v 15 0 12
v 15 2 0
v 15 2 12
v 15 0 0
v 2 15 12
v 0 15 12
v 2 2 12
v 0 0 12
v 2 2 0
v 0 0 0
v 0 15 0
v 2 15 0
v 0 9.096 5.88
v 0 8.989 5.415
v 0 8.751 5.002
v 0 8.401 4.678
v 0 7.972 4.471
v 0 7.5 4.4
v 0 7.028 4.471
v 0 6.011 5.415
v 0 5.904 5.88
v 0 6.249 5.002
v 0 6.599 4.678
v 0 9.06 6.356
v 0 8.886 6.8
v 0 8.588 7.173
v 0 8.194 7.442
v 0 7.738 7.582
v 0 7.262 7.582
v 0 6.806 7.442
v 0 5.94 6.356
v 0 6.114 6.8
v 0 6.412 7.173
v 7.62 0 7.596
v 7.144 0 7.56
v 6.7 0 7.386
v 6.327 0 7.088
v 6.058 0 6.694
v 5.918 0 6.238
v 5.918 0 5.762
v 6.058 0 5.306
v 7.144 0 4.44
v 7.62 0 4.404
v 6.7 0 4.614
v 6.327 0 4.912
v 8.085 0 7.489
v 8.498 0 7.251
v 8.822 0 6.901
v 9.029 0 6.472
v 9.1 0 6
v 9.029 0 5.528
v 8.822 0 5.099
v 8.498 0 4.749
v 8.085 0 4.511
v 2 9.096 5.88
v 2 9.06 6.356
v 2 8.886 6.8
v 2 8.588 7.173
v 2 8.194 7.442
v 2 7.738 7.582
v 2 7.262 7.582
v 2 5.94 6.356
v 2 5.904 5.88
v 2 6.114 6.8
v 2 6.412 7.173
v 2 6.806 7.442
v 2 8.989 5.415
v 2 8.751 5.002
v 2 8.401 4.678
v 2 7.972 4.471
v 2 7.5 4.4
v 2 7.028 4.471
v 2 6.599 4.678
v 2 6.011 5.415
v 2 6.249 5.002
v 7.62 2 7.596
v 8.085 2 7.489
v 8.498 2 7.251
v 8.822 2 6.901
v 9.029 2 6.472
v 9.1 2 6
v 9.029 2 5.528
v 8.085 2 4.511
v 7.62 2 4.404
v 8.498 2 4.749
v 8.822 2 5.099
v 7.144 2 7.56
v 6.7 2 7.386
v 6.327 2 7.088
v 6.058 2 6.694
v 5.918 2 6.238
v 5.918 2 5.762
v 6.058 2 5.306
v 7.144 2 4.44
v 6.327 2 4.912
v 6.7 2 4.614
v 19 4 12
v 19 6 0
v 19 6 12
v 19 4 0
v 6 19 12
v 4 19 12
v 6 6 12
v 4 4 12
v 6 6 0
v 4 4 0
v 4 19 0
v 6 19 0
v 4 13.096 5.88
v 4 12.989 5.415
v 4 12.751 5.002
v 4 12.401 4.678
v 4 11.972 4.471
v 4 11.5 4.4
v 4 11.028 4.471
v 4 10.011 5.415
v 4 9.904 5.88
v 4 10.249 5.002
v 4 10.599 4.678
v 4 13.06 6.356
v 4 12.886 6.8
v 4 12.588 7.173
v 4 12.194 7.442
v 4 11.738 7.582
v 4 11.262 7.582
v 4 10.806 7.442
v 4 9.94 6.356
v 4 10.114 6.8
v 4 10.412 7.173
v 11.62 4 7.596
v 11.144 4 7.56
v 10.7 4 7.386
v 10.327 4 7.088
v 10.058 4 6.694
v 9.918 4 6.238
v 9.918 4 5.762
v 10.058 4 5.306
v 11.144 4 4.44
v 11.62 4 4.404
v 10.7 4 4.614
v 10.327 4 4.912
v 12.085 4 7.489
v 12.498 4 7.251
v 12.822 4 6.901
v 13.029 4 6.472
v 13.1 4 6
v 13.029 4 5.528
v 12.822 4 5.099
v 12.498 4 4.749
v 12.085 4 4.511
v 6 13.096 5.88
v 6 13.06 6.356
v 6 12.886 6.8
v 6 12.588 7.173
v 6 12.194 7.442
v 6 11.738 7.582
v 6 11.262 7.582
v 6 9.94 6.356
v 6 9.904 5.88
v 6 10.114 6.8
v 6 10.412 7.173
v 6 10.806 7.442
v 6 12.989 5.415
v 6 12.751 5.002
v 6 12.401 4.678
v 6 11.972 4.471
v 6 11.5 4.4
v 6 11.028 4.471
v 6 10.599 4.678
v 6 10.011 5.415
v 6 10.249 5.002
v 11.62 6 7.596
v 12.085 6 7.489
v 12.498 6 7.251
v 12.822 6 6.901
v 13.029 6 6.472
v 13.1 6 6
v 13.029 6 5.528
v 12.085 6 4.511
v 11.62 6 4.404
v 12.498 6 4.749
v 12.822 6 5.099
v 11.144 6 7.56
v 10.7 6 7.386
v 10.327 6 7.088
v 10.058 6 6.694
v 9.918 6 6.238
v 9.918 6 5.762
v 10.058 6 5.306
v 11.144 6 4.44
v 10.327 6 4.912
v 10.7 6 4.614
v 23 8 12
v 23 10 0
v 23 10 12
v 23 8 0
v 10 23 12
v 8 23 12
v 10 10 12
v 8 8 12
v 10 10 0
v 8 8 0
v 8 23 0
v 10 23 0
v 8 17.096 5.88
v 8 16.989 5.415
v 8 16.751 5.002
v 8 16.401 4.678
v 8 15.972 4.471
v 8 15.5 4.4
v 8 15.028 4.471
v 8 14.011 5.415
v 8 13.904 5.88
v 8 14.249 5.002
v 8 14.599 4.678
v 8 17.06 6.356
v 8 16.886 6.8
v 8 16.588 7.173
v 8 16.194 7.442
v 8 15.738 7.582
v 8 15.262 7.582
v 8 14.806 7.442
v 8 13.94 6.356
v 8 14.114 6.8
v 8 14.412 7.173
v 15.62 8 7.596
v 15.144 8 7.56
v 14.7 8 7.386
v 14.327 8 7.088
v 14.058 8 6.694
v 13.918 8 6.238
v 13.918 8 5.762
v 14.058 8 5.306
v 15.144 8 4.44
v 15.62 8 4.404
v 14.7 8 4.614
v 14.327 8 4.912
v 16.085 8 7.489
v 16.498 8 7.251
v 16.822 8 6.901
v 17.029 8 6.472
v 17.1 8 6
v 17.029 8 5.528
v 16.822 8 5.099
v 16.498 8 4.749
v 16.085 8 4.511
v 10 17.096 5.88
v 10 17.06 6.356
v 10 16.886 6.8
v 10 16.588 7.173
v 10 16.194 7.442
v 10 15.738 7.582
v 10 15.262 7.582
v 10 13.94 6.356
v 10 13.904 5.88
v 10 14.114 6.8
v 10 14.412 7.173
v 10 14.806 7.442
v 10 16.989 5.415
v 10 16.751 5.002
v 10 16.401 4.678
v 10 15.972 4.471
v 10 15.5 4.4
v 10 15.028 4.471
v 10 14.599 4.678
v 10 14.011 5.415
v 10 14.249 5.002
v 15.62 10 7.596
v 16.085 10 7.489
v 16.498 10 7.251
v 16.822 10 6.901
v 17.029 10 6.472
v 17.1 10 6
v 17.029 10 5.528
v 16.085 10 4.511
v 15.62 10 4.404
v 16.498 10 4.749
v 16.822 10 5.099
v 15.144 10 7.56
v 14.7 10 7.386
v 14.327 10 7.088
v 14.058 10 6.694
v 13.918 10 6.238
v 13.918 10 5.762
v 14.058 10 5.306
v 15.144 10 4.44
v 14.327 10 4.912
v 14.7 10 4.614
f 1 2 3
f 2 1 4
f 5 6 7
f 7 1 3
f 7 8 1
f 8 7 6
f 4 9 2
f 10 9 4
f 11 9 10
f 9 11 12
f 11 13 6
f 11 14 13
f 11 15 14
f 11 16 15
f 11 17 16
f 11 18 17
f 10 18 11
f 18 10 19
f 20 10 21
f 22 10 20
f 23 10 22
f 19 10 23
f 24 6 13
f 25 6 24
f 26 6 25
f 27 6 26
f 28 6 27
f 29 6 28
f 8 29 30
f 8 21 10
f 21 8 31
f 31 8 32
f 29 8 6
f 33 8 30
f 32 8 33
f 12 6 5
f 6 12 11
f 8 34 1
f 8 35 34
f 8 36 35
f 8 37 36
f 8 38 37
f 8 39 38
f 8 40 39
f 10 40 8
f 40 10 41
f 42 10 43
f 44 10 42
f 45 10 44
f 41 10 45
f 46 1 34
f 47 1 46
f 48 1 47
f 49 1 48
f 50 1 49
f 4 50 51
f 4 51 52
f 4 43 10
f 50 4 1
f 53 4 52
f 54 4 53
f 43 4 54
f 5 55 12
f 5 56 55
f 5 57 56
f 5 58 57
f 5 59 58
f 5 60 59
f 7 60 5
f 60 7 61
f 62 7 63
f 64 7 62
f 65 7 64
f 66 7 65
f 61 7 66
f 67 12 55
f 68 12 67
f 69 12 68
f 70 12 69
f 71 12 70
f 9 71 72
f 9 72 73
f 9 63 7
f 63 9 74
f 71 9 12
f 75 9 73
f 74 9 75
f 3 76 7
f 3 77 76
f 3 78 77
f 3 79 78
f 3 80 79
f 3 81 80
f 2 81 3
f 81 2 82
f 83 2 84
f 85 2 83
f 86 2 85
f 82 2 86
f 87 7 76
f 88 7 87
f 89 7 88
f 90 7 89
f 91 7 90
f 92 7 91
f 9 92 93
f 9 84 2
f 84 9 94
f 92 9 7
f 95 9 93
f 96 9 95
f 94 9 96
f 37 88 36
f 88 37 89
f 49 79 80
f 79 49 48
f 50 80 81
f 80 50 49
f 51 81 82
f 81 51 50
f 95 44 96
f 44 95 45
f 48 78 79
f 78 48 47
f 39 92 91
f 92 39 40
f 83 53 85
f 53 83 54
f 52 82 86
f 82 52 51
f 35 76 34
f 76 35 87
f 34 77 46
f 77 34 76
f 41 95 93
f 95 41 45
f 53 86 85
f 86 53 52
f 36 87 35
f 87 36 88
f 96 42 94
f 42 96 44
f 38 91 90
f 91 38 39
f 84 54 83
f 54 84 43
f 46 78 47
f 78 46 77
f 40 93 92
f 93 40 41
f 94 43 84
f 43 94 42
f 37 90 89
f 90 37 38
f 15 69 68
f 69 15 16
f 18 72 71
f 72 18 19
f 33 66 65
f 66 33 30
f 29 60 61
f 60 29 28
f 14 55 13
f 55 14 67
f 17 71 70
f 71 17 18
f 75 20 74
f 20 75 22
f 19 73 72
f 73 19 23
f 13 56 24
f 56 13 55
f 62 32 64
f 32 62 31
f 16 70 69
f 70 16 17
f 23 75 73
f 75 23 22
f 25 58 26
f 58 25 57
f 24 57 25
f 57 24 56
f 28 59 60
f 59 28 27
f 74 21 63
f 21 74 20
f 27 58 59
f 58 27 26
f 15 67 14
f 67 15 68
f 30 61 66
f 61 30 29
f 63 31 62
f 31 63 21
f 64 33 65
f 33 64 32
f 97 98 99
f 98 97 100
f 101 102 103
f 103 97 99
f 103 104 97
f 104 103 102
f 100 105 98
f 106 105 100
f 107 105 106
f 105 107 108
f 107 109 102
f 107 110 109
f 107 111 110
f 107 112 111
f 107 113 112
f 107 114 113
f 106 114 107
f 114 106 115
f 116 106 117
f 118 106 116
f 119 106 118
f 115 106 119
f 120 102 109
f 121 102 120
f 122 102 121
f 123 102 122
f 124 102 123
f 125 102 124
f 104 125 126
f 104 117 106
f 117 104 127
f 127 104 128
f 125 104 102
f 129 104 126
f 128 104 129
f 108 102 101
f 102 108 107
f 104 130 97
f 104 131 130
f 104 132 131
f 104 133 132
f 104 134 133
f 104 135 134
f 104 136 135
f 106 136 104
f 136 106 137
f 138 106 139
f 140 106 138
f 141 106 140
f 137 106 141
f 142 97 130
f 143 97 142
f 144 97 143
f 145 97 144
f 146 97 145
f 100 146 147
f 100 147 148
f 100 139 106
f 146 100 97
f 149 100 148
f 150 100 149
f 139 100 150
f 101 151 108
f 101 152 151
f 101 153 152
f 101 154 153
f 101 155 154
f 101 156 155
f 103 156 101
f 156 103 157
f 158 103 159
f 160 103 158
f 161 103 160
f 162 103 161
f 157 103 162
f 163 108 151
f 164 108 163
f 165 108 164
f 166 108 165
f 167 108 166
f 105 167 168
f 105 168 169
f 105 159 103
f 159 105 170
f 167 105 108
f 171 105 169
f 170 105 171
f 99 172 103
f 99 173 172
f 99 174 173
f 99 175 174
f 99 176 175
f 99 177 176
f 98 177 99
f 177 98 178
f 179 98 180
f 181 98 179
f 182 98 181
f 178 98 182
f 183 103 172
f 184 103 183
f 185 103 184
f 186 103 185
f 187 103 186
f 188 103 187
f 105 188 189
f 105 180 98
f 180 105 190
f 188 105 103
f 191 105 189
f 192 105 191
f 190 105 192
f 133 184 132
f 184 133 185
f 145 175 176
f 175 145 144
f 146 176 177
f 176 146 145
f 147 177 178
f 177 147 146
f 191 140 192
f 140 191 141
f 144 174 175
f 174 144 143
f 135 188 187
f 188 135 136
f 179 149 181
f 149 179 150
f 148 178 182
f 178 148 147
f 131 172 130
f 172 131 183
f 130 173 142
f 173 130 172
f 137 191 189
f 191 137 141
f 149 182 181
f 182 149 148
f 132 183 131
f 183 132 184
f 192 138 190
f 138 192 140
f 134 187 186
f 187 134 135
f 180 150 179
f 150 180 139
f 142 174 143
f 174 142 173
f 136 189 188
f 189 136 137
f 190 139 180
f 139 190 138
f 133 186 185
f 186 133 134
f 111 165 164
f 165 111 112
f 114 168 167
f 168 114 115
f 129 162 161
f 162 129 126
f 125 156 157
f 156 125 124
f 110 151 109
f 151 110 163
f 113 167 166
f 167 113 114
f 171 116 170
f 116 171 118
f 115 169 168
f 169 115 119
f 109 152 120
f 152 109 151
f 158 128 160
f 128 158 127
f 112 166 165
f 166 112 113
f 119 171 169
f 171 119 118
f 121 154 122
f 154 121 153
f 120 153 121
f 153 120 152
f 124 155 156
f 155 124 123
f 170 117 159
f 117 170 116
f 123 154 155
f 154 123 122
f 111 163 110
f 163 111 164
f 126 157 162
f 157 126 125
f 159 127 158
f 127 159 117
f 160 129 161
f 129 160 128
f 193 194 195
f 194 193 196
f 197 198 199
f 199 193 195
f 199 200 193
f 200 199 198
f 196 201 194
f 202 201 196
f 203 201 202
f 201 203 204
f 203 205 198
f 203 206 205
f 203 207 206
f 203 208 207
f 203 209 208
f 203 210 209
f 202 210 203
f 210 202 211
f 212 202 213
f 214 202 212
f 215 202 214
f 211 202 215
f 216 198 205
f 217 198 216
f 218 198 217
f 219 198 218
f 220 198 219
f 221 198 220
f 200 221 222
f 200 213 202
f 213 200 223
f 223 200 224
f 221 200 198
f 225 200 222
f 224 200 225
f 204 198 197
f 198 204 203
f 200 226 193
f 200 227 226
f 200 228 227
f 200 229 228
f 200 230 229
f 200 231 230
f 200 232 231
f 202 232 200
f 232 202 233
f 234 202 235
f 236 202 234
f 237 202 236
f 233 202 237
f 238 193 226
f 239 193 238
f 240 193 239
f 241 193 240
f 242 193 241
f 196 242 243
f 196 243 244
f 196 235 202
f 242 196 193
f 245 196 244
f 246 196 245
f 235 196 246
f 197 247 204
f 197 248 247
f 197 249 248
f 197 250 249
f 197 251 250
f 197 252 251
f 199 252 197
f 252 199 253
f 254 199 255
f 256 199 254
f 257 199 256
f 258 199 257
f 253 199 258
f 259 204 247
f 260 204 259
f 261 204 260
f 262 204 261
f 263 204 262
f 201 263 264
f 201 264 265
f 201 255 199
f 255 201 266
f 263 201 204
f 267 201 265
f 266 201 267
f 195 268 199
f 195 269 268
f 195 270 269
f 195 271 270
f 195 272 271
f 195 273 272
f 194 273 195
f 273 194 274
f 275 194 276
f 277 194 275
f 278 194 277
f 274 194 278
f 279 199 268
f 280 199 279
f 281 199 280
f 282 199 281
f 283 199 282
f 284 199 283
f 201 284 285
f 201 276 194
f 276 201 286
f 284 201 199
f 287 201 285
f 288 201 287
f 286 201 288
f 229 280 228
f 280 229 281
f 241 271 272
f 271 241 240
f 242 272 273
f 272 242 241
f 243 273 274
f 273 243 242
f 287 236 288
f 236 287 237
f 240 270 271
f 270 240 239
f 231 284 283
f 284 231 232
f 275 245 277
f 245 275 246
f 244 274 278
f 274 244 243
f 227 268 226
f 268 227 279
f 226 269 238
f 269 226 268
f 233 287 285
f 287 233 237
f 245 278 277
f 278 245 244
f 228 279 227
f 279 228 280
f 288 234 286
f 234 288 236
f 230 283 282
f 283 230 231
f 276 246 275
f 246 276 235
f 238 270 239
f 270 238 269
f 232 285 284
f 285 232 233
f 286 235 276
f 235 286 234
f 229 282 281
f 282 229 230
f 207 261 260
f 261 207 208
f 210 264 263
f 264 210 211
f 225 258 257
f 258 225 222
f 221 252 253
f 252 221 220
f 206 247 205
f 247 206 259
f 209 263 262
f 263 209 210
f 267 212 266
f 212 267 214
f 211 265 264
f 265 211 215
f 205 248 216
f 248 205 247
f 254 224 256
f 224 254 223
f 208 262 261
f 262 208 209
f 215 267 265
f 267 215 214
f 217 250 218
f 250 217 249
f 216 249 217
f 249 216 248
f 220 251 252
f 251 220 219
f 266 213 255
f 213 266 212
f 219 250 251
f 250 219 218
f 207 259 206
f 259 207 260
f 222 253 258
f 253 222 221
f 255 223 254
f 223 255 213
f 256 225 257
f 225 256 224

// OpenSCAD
module bracket (l=15, w=12, t=2, d=3.2)
{
    difference () {
        cube ([l, l, w]);
        translate ([t, t, -w])
            cube ([l, l, 3*w]);
        translate ([l/2, 2*t, w/2])
            rotate ([90, 0, 0])
                cylinder (r=d/2, h=3*t);
        translate ([-t, l/2, w/2])
            rotate ([0, 90, 0])
                cylinder (r=d/2, h=3*t);
    }
}

for (k = [0 : 4 : 3*4 - 1])
    translate ([k, k, 0])
        bracket ($fa=3, $fs=0.5);
